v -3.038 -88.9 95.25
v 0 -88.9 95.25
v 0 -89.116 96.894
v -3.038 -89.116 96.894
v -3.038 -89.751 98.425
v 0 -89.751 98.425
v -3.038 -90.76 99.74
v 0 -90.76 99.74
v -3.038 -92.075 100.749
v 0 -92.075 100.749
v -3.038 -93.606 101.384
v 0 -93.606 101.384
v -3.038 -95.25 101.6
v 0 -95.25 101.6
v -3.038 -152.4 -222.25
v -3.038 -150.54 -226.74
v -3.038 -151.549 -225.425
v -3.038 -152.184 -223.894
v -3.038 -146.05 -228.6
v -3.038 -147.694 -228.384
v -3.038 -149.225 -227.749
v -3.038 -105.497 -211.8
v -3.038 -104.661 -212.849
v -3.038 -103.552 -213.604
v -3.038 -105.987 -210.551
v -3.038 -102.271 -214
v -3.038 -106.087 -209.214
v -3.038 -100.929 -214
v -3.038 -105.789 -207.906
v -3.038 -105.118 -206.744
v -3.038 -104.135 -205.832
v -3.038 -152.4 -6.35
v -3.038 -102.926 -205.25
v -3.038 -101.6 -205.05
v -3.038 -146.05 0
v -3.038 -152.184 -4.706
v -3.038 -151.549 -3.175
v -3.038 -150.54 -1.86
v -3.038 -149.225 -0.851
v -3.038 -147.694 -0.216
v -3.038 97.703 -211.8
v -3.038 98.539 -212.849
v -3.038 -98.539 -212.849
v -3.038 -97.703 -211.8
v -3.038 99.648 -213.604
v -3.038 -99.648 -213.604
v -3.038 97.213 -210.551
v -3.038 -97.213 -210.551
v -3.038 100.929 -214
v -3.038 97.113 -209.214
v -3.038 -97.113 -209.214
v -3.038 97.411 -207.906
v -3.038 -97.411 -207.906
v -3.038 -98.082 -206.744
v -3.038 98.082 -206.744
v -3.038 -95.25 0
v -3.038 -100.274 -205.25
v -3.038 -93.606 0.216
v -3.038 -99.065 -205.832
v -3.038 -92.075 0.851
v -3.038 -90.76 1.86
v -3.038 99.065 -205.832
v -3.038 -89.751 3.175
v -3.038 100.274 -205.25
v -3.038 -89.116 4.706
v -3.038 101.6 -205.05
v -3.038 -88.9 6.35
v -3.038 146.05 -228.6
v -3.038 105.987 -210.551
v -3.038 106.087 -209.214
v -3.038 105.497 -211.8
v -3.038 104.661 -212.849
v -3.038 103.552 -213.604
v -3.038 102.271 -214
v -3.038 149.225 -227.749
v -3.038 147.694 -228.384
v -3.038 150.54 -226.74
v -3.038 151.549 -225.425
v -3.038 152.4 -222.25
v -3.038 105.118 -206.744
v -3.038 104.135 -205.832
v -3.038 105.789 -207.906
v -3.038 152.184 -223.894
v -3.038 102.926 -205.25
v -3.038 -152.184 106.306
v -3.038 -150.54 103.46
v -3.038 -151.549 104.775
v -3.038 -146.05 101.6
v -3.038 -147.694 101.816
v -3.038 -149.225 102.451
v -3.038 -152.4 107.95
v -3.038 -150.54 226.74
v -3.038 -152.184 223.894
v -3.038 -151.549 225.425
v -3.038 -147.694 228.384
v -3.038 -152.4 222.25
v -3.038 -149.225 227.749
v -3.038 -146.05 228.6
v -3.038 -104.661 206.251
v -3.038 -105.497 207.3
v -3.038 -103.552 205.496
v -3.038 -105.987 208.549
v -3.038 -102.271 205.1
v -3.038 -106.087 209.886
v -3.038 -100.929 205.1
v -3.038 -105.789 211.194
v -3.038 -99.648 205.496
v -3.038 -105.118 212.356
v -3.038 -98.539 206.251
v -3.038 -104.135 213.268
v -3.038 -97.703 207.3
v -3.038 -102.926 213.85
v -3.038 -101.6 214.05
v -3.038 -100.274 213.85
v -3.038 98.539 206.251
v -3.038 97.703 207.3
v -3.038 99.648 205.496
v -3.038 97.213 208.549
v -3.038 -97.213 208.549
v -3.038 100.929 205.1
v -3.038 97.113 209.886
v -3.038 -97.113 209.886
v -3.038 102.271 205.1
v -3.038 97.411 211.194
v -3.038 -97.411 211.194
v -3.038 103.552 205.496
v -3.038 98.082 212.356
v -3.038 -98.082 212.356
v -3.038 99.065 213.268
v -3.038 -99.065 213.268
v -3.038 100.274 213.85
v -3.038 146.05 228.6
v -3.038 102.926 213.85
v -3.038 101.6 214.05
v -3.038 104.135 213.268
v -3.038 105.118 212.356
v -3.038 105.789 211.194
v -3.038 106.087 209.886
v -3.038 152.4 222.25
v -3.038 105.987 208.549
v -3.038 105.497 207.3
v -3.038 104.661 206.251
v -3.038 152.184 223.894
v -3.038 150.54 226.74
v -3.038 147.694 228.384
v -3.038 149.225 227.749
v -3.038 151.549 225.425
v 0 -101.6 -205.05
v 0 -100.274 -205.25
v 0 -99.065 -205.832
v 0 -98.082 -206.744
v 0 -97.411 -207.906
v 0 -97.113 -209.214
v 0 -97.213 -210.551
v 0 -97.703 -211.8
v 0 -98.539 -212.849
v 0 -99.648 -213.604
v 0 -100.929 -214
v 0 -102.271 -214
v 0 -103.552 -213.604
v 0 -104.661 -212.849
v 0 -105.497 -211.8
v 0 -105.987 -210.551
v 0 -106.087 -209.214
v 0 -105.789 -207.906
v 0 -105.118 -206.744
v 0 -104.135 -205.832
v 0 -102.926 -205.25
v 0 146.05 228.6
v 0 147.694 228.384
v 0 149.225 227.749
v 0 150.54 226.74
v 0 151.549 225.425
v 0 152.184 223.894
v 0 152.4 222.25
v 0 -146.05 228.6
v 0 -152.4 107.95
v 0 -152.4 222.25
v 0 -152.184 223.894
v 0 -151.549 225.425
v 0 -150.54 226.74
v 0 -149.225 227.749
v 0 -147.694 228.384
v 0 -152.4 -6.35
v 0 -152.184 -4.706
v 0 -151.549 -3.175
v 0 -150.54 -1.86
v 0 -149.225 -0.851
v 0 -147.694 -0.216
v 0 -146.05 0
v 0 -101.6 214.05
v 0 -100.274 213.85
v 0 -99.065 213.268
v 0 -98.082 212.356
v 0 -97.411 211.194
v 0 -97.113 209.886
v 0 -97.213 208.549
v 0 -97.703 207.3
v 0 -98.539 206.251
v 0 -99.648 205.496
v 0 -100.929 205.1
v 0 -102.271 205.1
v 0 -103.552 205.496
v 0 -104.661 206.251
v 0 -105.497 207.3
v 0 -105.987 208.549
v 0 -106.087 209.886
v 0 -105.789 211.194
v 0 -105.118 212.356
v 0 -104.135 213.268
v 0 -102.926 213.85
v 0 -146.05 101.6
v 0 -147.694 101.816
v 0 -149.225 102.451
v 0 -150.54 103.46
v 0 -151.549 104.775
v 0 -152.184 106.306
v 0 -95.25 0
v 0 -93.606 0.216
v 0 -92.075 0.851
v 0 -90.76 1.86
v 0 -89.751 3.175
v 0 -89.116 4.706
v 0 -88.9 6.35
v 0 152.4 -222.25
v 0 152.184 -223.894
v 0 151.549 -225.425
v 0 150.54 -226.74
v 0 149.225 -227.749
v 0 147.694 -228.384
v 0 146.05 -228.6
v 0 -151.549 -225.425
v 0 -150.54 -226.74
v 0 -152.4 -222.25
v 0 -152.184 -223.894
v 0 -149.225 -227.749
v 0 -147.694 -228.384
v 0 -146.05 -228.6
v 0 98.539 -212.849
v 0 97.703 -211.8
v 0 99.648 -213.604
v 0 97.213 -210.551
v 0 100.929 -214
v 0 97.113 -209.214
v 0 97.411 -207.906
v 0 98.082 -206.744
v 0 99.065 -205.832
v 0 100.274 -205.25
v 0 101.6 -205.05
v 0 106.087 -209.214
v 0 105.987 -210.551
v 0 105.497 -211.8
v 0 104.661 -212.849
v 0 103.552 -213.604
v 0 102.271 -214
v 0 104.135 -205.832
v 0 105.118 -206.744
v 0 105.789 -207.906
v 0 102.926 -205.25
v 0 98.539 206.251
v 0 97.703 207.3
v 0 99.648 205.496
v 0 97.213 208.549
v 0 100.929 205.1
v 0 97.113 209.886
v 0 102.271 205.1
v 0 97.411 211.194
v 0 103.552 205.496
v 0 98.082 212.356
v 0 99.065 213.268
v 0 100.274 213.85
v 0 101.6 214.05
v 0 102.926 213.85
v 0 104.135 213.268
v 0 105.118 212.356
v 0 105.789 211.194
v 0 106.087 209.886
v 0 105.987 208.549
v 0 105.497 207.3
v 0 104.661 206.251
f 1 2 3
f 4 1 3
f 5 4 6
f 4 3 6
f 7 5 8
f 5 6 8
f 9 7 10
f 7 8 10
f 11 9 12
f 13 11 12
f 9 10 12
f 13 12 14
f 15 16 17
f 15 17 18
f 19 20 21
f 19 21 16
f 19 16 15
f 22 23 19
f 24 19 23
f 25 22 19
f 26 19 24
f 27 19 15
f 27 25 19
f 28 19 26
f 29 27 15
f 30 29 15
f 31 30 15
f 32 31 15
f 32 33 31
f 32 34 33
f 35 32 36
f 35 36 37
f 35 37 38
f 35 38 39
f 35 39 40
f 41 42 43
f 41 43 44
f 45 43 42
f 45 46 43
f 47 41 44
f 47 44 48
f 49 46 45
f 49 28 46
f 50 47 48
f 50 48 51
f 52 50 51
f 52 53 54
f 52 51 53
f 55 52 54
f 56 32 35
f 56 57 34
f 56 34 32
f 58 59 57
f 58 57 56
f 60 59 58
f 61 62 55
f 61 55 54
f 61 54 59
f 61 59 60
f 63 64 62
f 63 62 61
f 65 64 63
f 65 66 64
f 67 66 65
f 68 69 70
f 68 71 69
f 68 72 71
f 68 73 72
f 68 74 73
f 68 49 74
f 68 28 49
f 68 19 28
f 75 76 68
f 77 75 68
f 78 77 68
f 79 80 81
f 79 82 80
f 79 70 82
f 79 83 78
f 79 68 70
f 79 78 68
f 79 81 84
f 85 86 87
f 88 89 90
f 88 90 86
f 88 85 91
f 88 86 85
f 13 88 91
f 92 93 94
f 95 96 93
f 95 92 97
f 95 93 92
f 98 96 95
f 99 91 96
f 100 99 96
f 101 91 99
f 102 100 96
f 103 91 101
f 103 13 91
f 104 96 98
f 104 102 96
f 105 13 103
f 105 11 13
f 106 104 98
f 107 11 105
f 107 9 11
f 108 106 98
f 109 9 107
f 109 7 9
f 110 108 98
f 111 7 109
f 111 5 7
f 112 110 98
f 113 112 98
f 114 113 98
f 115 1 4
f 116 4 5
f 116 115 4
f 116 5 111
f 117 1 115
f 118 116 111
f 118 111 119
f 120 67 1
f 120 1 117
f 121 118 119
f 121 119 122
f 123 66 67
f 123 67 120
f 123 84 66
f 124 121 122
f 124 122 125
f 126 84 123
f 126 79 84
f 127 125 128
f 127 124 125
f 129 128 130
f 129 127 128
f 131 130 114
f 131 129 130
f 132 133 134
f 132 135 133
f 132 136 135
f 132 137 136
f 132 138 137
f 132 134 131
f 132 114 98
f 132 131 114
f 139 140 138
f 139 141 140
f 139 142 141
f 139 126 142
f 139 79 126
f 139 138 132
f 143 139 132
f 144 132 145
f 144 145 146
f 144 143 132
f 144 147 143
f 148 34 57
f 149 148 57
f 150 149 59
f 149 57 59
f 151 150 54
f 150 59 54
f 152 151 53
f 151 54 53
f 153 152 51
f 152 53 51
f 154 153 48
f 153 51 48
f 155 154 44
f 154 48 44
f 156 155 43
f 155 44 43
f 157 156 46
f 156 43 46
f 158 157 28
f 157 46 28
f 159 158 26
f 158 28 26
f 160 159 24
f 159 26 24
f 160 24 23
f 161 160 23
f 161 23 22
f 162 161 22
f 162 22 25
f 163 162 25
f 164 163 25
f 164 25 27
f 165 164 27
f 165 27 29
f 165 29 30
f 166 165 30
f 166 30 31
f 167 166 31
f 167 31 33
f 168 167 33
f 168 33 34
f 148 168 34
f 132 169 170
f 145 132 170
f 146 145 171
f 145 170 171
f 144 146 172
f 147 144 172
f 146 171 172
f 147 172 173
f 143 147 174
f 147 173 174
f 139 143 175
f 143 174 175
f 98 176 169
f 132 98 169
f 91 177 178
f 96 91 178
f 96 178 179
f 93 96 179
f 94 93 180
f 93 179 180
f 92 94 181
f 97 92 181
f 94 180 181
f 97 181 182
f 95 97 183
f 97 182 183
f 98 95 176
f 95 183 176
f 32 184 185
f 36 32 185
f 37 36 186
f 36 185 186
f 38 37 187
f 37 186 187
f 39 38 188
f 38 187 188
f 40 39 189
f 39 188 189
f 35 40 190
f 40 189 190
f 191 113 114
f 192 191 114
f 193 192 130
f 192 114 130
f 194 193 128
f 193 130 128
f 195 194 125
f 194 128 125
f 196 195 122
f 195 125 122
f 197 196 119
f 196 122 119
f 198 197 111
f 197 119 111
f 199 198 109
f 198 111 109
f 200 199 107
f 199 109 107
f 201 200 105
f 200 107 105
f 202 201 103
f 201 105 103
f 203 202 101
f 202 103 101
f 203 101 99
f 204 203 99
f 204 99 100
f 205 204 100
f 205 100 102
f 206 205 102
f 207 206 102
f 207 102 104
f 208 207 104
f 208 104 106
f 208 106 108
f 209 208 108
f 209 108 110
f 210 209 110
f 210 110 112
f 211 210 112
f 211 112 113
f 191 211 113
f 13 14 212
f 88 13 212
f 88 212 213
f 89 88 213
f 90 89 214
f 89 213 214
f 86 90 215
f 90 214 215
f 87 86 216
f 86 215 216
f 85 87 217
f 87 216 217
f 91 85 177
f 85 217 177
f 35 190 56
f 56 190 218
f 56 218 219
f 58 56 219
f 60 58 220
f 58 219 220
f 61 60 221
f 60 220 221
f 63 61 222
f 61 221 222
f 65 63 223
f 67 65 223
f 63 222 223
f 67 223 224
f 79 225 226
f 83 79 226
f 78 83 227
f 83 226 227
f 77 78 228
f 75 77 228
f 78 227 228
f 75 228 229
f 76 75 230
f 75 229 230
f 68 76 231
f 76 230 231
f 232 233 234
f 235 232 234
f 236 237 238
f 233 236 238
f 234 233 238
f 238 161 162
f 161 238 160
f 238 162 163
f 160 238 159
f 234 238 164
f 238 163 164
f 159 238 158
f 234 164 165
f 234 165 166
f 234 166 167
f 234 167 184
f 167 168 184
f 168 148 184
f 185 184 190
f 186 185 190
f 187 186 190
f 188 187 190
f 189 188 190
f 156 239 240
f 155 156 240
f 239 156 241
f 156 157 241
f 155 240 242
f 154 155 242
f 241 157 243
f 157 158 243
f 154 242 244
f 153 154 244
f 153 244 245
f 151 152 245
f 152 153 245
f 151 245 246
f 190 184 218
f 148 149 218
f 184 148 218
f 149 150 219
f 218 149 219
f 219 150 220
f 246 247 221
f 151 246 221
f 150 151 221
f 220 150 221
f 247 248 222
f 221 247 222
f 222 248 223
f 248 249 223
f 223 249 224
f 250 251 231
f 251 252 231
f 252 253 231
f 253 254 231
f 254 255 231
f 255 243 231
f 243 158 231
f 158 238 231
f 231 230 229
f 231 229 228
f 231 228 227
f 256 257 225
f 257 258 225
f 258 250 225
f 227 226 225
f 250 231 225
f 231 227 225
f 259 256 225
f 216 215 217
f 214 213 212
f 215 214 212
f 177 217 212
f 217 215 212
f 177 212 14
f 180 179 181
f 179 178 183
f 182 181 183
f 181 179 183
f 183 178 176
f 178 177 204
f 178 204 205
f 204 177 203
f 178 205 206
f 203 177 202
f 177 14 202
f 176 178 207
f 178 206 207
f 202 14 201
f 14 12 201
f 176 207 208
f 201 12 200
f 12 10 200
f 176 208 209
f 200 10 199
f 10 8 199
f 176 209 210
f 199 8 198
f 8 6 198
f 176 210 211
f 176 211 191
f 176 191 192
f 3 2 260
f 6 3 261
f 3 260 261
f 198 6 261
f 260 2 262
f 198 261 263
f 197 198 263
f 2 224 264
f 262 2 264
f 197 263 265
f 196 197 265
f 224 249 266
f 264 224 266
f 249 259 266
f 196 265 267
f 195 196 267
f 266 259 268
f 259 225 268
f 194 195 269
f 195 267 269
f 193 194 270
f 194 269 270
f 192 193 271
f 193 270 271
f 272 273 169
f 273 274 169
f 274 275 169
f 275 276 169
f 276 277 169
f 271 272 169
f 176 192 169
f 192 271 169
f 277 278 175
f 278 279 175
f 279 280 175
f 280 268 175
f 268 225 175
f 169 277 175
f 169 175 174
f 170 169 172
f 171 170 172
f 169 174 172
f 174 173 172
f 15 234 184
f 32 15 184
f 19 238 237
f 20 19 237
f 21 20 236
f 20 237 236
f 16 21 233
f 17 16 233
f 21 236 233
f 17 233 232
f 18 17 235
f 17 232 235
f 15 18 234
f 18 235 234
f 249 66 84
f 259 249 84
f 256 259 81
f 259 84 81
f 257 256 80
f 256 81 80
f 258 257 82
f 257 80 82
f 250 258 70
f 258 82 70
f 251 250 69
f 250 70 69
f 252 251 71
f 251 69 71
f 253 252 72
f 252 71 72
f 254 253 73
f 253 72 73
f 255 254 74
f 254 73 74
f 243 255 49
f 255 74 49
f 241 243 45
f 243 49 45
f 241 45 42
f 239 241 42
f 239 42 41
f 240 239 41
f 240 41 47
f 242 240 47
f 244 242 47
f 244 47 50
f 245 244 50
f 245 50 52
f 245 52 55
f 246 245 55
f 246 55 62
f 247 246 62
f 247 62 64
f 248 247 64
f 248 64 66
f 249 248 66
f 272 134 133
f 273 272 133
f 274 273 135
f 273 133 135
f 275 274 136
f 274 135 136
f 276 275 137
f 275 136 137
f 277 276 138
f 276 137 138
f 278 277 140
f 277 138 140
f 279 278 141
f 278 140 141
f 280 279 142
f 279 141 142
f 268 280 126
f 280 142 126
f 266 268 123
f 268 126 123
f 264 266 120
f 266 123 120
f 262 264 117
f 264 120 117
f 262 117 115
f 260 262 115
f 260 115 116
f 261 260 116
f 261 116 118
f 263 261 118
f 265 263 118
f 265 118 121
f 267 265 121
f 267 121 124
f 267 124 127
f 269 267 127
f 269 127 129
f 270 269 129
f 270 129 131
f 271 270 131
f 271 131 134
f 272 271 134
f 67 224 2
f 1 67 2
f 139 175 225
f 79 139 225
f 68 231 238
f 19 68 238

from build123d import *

# Parameters (mm, degrees)
BASE_FLANGE1_DEPTH   = 3.03784
M8_CLEARANCE_HOLE1_D = 9


# Sheet-metal steps are written as plain solids
with BuildPart() as part:
    # Sketch1 → Base-Flange1 (new body)
    with BuildSketch(Plane(origin=(0, 0, 0), x_dir=(0, 0, -1), z_dir=(1, 0, 0))):
        with BuildLine():
            Line((-107.95, -152.4), (-222.25, -152.4))
            ThreePointArc((-222.25, -152.4), (-226.740128061, -150.540128061), (-228.6, -146.05))
            Line((-228.6, -146.05), (-228.6, 146.05))
            ThreePointArc((-228.6, 146.05), (-226.740128061, 150.540128061), (-222.25, 152.4))
            Line((-222.25, 152.4), (222.25, 152.4))
            ThreePointArc((222.25, 152.4), (226.740128061, 150.540128061), (228.6, 146.05))
            Line((228.6, 146.05), (228.6, -146.05))
            ThreePointArc((228.6, -146.05), (226.740128061, -150.540128061), (222.25, -152.4))
            Line((222.25, -152.4), (6.35, -152.4))
            ThreePointArc((6.35, -152.4), (1.859871939, -150.540128061), (0, -146.05))
            Line((0, -146.05), (0, -95.25))
            ThreePointArc((0, -95.25), (-1.859871939, -90.759871939), (-6.35, -88.9))
            Line((-6.35, -88.9), (-95.25, -88.9))
            ThreePointArc((-95.25, -88.9), (-99.740128061, -90.759871939), (-101.6, -95.25))
            Line((-101.6, -95.25), (-101.6, -146.05))
            ThreePointArc((-101.6, -146.05), (-103.459871939, -150.540128061), (-107.95, -152.4))
        make_face()
    extrude(amount=-BASE_FLANGE1_DEPTH)

    # M8 Clearance Hole1 (through all)
    with Locations(Plane(origin=(0, 0, 0), x_dir=(0, 0, -1), z_dir=(1, 0, 0))):
        with Locations((-209.55, 101.6), (-209.55, -101.6), (209.55, -101.6), (209.55, 101.6)):
            Hole(M8_CLEARANCE_HOLE1_D / 2)


solid = part.part
